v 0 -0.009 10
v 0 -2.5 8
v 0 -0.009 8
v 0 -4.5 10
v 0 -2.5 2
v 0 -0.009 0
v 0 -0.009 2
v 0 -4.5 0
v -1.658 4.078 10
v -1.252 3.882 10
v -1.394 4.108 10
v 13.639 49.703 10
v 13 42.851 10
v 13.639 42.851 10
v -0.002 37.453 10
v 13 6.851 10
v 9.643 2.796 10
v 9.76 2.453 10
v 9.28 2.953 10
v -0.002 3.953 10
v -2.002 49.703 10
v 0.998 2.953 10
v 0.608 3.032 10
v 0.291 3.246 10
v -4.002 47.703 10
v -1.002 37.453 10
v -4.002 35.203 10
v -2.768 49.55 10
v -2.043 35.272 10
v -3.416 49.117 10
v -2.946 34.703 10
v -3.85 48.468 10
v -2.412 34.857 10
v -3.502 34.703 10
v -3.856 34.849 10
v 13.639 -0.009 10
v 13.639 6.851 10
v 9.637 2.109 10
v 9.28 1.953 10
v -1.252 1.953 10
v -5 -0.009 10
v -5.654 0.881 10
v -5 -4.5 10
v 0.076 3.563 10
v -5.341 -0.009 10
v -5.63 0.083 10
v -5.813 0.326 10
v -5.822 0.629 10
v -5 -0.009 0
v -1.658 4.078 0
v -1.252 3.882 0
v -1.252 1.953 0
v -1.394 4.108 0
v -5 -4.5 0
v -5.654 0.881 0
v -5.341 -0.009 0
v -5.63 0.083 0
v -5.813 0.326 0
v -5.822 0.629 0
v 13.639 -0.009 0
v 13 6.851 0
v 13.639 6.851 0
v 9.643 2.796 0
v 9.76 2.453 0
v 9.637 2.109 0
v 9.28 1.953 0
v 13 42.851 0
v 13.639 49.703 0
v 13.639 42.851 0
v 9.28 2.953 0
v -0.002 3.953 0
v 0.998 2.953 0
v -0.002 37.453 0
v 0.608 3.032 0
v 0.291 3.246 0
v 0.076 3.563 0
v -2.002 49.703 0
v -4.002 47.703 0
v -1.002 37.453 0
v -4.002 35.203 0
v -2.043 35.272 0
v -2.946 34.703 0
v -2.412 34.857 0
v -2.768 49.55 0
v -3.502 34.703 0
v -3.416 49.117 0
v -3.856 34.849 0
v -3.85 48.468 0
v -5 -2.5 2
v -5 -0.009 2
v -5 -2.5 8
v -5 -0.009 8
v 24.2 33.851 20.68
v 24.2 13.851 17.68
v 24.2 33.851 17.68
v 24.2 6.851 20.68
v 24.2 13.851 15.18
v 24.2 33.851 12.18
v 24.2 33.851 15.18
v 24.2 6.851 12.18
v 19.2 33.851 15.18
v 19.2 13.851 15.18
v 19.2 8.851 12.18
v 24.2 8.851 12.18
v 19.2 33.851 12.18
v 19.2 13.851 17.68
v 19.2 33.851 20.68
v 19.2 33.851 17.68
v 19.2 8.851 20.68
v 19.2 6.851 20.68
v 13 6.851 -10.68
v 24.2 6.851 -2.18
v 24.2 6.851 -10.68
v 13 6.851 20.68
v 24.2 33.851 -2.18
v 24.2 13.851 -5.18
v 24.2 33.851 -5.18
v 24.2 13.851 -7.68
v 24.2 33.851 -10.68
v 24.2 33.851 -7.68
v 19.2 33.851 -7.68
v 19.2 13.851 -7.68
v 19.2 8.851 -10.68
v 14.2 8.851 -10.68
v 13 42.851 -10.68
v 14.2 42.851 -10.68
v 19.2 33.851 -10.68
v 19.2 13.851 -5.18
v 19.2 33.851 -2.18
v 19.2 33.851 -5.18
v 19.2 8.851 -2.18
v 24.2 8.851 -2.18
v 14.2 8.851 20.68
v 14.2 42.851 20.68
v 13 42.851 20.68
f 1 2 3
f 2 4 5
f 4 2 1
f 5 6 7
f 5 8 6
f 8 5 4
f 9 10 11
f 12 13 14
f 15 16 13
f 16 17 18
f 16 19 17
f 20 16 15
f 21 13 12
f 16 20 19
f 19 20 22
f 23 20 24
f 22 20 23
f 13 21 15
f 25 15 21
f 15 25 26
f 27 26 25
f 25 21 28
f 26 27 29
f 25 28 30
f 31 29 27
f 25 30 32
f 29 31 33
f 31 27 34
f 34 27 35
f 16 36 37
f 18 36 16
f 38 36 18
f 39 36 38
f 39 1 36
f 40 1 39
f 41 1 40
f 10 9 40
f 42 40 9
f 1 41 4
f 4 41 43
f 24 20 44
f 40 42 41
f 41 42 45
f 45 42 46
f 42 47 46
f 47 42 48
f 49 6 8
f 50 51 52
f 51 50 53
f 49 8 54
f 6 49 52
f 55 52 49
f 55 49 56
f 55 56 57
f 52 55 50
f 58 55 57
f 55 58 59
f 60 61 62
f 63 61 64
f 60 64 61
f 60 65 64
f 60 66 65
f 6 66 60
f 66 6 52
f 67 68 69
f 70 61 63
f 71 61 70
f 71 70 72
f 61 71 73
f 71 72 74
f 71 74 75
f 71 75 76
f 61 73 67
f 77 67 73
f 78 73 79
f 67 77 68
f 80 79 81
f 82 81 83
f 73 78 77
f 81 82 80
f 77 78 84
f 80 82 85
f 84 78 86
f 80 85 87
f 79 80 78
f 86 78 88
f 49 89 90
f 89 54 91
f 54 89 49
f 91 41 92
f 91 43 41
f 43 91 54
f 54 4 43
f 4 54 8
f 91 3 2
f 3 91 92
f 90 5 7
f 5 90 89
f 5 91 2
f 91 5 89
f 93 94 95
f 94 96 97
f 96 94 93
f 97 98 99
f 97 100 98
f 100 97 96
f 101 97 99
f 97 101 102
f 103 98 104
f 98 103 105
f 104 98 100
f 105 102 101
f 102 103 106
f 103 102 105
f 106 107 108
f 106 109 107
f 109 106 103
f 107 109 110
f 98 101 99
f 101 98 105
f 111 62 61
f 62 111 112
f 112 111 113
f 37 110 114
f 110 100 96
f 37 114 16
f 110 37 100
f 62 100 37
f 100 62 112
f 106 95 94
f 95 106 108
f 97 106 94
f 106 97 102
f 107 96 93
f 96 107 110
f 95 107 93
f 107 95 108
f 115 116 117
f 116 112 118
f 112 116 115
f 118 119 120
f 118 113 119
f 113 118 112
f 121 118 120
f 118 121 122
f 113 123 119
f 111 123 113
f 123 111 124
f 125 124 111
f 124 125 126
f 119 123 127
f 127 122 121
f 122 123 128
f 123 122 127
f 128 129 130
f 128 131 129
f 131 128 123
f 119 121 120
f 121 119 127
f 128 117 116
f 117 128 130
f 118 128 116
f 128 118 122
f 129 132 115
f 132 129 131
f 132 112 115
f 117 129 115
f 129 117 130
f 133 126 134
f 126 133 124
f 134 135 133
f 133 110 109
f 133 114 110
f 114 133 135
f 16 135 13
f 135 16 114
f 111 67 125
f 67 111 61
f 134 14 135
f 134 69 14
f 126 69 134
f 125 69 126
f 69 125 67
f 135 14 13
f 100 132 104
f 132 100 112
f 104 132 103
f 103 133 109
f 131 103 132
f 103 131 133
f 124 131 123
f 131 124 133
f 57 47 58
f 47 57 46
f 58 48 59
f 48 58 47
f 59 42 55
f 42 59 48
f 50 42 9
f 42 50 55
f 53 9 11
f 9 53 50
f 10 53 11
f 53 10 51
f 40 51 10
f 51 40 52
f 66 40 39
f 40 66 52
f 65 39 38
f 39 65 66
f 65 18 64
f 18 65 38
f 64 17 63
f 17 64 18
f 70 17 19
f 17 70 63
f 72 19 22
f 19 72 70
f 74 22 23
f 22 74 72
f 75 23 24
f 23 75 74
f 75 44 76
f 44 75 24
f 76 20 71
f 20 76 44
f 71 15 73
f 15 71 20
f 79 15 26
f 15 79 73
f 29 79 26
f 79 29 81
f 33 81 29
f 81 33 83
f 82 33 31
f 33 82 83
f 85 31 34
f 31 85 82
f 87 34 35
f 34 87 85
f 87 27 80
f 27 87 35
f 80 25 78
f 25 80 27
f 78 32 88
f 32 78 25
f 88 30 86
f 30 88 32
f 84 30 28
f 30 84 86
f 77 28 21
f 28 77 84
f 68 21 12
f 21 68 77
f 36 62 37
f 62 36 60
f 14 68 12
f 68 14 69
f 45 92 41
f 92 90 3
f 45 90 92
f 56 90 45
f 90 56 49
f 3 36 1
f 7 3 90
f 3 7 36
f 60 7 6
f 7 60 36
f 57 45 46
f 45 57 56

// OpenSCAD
clipHeight = 49.7026;
clipWidth = 10;

clipHookThickness = 2;
clipHookOpening = 2.5;
clipHookDepth = 5;

buildPlateX = 13.0;

mountBottomThickness = 2;
mountBackgroundThickness = 1.2;
mountGripThickness = 3;

mountGripHeightOffset = 5;
mountGripHeight = 5;
mountGripLength = 20 + 7;
mountGripLengthSpacer = 7;

pinDistance = 22.86;
pinThickness = 2.5;

moduleHeight = 34; // TODO

moduleMountWidth = pinDistance + pinThickness + 2 * mountGripThickness;
moduleMountHeight = moduleHeight + mountBottomThickness;
moduleMountDepth = mountBackgroundThickness + mountGripHeightOffset + mountGripHeight;

// Original CC-BY Robert Hunt:
// https://www.thingiverse.com/thing:101024
module dinClip() {
    translate([13.78, -0.15, 0])
    scale([-1, 1, 1])
	difference() {
		linear_extrude(height=clipWidth, convexity=5)
        import(file="din_clip_01.dxf", layer="0", $fn=64);
    }
}

module moduleMount() {
    cube([mountBackgroundThickness, moduleMountHeight, moduleMountWidth]);
    cube([moduleMountDepth, mountBottomThickness, moduleMountWidth]);
    
    translate([mountBackgroundThickness + mountGripHeightOffset, 0, 0]) {
        cube([mountGripHeight, mountGripLength, mountGripThickness]);
        
        translate([0, 0, mountGripThickness])
        cube([mountGripHeight, mountGripLengthSpacer, pinThickness]);
        
        translate([0, 0, mountGripThickness + pinThickness])
        cube([mountGripHeight, mountGripLength, mountGripThickness]);
        
        translate([0, 0, pinDistance]) {
            cube([mountGripHeight, mountGripLength, mountGripThickness]);
            
            translate([0, 0, mountGripThickness])
            cube([mountGripHeight, mountGripLengthSpacer, pinThickness]);
        
            translate([0, 0, mountGripThickness + pinThickness])
            cube([mountGripHeight, mountGripLength, mountGripThickness]);
        }
    }
}

module clipHook() {
    difference() {
        cube([clipHookDepth, clipHookThickness + clipHookOpening, clipWidth]);
        
        translate([0, clipHookThickness, clipHookThickness])
        cube([clipHookDepth, clipHookOpening, clipWidth - 2 * clipHookThickness]);
    }
}

module fullAssembly() {
    dinClip();
    
    translate([-clipHookDepth, -clipHookThickness - clipHookOpening, 0])
    clipHook();
    
    translate([buildPlateX, (clipHeight - moduleMountHeight) / 2, (clipWidth - moduleMountWidth) / 2])
    moduleMount();
}

fullAssembly();
